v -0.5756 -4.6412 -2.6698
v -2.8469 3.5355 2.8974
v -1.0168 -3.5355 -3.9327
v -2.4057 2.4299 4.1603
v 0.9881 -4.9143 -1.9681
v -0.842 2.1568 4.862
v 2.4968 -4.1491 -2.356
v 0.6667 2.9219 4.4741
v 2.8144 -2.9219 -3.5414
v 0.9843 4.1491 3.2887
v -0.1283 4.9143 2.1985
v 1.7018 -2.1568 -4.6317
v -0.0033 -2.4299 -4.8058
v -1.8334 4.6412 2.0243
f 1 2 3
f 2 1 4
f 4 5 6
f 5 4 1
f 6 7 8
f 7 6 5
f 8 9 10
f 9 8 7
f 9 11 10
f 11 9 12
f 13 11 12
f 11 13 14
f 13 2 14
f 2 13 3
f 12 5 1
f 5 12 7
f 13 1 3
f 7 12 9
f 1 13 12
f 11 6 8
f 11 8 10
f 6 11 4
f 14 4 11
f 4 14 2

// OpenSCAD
// Generated by generate_scads.py
rotate([45,15,180]) {
  cylinder(h=10, r=2, center=true);
}
